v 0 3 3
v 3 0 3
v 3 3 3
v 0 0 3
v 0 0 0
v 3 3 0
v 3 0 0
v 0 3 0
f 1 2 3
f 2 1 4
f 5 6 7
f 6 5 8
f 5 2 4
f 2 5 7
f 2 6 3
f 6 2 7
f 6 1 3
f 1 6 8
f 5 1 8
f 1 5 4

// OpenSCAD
union() {
  translate([0, 0, 0]) cube(size=[3,3,3], center=false);
}
